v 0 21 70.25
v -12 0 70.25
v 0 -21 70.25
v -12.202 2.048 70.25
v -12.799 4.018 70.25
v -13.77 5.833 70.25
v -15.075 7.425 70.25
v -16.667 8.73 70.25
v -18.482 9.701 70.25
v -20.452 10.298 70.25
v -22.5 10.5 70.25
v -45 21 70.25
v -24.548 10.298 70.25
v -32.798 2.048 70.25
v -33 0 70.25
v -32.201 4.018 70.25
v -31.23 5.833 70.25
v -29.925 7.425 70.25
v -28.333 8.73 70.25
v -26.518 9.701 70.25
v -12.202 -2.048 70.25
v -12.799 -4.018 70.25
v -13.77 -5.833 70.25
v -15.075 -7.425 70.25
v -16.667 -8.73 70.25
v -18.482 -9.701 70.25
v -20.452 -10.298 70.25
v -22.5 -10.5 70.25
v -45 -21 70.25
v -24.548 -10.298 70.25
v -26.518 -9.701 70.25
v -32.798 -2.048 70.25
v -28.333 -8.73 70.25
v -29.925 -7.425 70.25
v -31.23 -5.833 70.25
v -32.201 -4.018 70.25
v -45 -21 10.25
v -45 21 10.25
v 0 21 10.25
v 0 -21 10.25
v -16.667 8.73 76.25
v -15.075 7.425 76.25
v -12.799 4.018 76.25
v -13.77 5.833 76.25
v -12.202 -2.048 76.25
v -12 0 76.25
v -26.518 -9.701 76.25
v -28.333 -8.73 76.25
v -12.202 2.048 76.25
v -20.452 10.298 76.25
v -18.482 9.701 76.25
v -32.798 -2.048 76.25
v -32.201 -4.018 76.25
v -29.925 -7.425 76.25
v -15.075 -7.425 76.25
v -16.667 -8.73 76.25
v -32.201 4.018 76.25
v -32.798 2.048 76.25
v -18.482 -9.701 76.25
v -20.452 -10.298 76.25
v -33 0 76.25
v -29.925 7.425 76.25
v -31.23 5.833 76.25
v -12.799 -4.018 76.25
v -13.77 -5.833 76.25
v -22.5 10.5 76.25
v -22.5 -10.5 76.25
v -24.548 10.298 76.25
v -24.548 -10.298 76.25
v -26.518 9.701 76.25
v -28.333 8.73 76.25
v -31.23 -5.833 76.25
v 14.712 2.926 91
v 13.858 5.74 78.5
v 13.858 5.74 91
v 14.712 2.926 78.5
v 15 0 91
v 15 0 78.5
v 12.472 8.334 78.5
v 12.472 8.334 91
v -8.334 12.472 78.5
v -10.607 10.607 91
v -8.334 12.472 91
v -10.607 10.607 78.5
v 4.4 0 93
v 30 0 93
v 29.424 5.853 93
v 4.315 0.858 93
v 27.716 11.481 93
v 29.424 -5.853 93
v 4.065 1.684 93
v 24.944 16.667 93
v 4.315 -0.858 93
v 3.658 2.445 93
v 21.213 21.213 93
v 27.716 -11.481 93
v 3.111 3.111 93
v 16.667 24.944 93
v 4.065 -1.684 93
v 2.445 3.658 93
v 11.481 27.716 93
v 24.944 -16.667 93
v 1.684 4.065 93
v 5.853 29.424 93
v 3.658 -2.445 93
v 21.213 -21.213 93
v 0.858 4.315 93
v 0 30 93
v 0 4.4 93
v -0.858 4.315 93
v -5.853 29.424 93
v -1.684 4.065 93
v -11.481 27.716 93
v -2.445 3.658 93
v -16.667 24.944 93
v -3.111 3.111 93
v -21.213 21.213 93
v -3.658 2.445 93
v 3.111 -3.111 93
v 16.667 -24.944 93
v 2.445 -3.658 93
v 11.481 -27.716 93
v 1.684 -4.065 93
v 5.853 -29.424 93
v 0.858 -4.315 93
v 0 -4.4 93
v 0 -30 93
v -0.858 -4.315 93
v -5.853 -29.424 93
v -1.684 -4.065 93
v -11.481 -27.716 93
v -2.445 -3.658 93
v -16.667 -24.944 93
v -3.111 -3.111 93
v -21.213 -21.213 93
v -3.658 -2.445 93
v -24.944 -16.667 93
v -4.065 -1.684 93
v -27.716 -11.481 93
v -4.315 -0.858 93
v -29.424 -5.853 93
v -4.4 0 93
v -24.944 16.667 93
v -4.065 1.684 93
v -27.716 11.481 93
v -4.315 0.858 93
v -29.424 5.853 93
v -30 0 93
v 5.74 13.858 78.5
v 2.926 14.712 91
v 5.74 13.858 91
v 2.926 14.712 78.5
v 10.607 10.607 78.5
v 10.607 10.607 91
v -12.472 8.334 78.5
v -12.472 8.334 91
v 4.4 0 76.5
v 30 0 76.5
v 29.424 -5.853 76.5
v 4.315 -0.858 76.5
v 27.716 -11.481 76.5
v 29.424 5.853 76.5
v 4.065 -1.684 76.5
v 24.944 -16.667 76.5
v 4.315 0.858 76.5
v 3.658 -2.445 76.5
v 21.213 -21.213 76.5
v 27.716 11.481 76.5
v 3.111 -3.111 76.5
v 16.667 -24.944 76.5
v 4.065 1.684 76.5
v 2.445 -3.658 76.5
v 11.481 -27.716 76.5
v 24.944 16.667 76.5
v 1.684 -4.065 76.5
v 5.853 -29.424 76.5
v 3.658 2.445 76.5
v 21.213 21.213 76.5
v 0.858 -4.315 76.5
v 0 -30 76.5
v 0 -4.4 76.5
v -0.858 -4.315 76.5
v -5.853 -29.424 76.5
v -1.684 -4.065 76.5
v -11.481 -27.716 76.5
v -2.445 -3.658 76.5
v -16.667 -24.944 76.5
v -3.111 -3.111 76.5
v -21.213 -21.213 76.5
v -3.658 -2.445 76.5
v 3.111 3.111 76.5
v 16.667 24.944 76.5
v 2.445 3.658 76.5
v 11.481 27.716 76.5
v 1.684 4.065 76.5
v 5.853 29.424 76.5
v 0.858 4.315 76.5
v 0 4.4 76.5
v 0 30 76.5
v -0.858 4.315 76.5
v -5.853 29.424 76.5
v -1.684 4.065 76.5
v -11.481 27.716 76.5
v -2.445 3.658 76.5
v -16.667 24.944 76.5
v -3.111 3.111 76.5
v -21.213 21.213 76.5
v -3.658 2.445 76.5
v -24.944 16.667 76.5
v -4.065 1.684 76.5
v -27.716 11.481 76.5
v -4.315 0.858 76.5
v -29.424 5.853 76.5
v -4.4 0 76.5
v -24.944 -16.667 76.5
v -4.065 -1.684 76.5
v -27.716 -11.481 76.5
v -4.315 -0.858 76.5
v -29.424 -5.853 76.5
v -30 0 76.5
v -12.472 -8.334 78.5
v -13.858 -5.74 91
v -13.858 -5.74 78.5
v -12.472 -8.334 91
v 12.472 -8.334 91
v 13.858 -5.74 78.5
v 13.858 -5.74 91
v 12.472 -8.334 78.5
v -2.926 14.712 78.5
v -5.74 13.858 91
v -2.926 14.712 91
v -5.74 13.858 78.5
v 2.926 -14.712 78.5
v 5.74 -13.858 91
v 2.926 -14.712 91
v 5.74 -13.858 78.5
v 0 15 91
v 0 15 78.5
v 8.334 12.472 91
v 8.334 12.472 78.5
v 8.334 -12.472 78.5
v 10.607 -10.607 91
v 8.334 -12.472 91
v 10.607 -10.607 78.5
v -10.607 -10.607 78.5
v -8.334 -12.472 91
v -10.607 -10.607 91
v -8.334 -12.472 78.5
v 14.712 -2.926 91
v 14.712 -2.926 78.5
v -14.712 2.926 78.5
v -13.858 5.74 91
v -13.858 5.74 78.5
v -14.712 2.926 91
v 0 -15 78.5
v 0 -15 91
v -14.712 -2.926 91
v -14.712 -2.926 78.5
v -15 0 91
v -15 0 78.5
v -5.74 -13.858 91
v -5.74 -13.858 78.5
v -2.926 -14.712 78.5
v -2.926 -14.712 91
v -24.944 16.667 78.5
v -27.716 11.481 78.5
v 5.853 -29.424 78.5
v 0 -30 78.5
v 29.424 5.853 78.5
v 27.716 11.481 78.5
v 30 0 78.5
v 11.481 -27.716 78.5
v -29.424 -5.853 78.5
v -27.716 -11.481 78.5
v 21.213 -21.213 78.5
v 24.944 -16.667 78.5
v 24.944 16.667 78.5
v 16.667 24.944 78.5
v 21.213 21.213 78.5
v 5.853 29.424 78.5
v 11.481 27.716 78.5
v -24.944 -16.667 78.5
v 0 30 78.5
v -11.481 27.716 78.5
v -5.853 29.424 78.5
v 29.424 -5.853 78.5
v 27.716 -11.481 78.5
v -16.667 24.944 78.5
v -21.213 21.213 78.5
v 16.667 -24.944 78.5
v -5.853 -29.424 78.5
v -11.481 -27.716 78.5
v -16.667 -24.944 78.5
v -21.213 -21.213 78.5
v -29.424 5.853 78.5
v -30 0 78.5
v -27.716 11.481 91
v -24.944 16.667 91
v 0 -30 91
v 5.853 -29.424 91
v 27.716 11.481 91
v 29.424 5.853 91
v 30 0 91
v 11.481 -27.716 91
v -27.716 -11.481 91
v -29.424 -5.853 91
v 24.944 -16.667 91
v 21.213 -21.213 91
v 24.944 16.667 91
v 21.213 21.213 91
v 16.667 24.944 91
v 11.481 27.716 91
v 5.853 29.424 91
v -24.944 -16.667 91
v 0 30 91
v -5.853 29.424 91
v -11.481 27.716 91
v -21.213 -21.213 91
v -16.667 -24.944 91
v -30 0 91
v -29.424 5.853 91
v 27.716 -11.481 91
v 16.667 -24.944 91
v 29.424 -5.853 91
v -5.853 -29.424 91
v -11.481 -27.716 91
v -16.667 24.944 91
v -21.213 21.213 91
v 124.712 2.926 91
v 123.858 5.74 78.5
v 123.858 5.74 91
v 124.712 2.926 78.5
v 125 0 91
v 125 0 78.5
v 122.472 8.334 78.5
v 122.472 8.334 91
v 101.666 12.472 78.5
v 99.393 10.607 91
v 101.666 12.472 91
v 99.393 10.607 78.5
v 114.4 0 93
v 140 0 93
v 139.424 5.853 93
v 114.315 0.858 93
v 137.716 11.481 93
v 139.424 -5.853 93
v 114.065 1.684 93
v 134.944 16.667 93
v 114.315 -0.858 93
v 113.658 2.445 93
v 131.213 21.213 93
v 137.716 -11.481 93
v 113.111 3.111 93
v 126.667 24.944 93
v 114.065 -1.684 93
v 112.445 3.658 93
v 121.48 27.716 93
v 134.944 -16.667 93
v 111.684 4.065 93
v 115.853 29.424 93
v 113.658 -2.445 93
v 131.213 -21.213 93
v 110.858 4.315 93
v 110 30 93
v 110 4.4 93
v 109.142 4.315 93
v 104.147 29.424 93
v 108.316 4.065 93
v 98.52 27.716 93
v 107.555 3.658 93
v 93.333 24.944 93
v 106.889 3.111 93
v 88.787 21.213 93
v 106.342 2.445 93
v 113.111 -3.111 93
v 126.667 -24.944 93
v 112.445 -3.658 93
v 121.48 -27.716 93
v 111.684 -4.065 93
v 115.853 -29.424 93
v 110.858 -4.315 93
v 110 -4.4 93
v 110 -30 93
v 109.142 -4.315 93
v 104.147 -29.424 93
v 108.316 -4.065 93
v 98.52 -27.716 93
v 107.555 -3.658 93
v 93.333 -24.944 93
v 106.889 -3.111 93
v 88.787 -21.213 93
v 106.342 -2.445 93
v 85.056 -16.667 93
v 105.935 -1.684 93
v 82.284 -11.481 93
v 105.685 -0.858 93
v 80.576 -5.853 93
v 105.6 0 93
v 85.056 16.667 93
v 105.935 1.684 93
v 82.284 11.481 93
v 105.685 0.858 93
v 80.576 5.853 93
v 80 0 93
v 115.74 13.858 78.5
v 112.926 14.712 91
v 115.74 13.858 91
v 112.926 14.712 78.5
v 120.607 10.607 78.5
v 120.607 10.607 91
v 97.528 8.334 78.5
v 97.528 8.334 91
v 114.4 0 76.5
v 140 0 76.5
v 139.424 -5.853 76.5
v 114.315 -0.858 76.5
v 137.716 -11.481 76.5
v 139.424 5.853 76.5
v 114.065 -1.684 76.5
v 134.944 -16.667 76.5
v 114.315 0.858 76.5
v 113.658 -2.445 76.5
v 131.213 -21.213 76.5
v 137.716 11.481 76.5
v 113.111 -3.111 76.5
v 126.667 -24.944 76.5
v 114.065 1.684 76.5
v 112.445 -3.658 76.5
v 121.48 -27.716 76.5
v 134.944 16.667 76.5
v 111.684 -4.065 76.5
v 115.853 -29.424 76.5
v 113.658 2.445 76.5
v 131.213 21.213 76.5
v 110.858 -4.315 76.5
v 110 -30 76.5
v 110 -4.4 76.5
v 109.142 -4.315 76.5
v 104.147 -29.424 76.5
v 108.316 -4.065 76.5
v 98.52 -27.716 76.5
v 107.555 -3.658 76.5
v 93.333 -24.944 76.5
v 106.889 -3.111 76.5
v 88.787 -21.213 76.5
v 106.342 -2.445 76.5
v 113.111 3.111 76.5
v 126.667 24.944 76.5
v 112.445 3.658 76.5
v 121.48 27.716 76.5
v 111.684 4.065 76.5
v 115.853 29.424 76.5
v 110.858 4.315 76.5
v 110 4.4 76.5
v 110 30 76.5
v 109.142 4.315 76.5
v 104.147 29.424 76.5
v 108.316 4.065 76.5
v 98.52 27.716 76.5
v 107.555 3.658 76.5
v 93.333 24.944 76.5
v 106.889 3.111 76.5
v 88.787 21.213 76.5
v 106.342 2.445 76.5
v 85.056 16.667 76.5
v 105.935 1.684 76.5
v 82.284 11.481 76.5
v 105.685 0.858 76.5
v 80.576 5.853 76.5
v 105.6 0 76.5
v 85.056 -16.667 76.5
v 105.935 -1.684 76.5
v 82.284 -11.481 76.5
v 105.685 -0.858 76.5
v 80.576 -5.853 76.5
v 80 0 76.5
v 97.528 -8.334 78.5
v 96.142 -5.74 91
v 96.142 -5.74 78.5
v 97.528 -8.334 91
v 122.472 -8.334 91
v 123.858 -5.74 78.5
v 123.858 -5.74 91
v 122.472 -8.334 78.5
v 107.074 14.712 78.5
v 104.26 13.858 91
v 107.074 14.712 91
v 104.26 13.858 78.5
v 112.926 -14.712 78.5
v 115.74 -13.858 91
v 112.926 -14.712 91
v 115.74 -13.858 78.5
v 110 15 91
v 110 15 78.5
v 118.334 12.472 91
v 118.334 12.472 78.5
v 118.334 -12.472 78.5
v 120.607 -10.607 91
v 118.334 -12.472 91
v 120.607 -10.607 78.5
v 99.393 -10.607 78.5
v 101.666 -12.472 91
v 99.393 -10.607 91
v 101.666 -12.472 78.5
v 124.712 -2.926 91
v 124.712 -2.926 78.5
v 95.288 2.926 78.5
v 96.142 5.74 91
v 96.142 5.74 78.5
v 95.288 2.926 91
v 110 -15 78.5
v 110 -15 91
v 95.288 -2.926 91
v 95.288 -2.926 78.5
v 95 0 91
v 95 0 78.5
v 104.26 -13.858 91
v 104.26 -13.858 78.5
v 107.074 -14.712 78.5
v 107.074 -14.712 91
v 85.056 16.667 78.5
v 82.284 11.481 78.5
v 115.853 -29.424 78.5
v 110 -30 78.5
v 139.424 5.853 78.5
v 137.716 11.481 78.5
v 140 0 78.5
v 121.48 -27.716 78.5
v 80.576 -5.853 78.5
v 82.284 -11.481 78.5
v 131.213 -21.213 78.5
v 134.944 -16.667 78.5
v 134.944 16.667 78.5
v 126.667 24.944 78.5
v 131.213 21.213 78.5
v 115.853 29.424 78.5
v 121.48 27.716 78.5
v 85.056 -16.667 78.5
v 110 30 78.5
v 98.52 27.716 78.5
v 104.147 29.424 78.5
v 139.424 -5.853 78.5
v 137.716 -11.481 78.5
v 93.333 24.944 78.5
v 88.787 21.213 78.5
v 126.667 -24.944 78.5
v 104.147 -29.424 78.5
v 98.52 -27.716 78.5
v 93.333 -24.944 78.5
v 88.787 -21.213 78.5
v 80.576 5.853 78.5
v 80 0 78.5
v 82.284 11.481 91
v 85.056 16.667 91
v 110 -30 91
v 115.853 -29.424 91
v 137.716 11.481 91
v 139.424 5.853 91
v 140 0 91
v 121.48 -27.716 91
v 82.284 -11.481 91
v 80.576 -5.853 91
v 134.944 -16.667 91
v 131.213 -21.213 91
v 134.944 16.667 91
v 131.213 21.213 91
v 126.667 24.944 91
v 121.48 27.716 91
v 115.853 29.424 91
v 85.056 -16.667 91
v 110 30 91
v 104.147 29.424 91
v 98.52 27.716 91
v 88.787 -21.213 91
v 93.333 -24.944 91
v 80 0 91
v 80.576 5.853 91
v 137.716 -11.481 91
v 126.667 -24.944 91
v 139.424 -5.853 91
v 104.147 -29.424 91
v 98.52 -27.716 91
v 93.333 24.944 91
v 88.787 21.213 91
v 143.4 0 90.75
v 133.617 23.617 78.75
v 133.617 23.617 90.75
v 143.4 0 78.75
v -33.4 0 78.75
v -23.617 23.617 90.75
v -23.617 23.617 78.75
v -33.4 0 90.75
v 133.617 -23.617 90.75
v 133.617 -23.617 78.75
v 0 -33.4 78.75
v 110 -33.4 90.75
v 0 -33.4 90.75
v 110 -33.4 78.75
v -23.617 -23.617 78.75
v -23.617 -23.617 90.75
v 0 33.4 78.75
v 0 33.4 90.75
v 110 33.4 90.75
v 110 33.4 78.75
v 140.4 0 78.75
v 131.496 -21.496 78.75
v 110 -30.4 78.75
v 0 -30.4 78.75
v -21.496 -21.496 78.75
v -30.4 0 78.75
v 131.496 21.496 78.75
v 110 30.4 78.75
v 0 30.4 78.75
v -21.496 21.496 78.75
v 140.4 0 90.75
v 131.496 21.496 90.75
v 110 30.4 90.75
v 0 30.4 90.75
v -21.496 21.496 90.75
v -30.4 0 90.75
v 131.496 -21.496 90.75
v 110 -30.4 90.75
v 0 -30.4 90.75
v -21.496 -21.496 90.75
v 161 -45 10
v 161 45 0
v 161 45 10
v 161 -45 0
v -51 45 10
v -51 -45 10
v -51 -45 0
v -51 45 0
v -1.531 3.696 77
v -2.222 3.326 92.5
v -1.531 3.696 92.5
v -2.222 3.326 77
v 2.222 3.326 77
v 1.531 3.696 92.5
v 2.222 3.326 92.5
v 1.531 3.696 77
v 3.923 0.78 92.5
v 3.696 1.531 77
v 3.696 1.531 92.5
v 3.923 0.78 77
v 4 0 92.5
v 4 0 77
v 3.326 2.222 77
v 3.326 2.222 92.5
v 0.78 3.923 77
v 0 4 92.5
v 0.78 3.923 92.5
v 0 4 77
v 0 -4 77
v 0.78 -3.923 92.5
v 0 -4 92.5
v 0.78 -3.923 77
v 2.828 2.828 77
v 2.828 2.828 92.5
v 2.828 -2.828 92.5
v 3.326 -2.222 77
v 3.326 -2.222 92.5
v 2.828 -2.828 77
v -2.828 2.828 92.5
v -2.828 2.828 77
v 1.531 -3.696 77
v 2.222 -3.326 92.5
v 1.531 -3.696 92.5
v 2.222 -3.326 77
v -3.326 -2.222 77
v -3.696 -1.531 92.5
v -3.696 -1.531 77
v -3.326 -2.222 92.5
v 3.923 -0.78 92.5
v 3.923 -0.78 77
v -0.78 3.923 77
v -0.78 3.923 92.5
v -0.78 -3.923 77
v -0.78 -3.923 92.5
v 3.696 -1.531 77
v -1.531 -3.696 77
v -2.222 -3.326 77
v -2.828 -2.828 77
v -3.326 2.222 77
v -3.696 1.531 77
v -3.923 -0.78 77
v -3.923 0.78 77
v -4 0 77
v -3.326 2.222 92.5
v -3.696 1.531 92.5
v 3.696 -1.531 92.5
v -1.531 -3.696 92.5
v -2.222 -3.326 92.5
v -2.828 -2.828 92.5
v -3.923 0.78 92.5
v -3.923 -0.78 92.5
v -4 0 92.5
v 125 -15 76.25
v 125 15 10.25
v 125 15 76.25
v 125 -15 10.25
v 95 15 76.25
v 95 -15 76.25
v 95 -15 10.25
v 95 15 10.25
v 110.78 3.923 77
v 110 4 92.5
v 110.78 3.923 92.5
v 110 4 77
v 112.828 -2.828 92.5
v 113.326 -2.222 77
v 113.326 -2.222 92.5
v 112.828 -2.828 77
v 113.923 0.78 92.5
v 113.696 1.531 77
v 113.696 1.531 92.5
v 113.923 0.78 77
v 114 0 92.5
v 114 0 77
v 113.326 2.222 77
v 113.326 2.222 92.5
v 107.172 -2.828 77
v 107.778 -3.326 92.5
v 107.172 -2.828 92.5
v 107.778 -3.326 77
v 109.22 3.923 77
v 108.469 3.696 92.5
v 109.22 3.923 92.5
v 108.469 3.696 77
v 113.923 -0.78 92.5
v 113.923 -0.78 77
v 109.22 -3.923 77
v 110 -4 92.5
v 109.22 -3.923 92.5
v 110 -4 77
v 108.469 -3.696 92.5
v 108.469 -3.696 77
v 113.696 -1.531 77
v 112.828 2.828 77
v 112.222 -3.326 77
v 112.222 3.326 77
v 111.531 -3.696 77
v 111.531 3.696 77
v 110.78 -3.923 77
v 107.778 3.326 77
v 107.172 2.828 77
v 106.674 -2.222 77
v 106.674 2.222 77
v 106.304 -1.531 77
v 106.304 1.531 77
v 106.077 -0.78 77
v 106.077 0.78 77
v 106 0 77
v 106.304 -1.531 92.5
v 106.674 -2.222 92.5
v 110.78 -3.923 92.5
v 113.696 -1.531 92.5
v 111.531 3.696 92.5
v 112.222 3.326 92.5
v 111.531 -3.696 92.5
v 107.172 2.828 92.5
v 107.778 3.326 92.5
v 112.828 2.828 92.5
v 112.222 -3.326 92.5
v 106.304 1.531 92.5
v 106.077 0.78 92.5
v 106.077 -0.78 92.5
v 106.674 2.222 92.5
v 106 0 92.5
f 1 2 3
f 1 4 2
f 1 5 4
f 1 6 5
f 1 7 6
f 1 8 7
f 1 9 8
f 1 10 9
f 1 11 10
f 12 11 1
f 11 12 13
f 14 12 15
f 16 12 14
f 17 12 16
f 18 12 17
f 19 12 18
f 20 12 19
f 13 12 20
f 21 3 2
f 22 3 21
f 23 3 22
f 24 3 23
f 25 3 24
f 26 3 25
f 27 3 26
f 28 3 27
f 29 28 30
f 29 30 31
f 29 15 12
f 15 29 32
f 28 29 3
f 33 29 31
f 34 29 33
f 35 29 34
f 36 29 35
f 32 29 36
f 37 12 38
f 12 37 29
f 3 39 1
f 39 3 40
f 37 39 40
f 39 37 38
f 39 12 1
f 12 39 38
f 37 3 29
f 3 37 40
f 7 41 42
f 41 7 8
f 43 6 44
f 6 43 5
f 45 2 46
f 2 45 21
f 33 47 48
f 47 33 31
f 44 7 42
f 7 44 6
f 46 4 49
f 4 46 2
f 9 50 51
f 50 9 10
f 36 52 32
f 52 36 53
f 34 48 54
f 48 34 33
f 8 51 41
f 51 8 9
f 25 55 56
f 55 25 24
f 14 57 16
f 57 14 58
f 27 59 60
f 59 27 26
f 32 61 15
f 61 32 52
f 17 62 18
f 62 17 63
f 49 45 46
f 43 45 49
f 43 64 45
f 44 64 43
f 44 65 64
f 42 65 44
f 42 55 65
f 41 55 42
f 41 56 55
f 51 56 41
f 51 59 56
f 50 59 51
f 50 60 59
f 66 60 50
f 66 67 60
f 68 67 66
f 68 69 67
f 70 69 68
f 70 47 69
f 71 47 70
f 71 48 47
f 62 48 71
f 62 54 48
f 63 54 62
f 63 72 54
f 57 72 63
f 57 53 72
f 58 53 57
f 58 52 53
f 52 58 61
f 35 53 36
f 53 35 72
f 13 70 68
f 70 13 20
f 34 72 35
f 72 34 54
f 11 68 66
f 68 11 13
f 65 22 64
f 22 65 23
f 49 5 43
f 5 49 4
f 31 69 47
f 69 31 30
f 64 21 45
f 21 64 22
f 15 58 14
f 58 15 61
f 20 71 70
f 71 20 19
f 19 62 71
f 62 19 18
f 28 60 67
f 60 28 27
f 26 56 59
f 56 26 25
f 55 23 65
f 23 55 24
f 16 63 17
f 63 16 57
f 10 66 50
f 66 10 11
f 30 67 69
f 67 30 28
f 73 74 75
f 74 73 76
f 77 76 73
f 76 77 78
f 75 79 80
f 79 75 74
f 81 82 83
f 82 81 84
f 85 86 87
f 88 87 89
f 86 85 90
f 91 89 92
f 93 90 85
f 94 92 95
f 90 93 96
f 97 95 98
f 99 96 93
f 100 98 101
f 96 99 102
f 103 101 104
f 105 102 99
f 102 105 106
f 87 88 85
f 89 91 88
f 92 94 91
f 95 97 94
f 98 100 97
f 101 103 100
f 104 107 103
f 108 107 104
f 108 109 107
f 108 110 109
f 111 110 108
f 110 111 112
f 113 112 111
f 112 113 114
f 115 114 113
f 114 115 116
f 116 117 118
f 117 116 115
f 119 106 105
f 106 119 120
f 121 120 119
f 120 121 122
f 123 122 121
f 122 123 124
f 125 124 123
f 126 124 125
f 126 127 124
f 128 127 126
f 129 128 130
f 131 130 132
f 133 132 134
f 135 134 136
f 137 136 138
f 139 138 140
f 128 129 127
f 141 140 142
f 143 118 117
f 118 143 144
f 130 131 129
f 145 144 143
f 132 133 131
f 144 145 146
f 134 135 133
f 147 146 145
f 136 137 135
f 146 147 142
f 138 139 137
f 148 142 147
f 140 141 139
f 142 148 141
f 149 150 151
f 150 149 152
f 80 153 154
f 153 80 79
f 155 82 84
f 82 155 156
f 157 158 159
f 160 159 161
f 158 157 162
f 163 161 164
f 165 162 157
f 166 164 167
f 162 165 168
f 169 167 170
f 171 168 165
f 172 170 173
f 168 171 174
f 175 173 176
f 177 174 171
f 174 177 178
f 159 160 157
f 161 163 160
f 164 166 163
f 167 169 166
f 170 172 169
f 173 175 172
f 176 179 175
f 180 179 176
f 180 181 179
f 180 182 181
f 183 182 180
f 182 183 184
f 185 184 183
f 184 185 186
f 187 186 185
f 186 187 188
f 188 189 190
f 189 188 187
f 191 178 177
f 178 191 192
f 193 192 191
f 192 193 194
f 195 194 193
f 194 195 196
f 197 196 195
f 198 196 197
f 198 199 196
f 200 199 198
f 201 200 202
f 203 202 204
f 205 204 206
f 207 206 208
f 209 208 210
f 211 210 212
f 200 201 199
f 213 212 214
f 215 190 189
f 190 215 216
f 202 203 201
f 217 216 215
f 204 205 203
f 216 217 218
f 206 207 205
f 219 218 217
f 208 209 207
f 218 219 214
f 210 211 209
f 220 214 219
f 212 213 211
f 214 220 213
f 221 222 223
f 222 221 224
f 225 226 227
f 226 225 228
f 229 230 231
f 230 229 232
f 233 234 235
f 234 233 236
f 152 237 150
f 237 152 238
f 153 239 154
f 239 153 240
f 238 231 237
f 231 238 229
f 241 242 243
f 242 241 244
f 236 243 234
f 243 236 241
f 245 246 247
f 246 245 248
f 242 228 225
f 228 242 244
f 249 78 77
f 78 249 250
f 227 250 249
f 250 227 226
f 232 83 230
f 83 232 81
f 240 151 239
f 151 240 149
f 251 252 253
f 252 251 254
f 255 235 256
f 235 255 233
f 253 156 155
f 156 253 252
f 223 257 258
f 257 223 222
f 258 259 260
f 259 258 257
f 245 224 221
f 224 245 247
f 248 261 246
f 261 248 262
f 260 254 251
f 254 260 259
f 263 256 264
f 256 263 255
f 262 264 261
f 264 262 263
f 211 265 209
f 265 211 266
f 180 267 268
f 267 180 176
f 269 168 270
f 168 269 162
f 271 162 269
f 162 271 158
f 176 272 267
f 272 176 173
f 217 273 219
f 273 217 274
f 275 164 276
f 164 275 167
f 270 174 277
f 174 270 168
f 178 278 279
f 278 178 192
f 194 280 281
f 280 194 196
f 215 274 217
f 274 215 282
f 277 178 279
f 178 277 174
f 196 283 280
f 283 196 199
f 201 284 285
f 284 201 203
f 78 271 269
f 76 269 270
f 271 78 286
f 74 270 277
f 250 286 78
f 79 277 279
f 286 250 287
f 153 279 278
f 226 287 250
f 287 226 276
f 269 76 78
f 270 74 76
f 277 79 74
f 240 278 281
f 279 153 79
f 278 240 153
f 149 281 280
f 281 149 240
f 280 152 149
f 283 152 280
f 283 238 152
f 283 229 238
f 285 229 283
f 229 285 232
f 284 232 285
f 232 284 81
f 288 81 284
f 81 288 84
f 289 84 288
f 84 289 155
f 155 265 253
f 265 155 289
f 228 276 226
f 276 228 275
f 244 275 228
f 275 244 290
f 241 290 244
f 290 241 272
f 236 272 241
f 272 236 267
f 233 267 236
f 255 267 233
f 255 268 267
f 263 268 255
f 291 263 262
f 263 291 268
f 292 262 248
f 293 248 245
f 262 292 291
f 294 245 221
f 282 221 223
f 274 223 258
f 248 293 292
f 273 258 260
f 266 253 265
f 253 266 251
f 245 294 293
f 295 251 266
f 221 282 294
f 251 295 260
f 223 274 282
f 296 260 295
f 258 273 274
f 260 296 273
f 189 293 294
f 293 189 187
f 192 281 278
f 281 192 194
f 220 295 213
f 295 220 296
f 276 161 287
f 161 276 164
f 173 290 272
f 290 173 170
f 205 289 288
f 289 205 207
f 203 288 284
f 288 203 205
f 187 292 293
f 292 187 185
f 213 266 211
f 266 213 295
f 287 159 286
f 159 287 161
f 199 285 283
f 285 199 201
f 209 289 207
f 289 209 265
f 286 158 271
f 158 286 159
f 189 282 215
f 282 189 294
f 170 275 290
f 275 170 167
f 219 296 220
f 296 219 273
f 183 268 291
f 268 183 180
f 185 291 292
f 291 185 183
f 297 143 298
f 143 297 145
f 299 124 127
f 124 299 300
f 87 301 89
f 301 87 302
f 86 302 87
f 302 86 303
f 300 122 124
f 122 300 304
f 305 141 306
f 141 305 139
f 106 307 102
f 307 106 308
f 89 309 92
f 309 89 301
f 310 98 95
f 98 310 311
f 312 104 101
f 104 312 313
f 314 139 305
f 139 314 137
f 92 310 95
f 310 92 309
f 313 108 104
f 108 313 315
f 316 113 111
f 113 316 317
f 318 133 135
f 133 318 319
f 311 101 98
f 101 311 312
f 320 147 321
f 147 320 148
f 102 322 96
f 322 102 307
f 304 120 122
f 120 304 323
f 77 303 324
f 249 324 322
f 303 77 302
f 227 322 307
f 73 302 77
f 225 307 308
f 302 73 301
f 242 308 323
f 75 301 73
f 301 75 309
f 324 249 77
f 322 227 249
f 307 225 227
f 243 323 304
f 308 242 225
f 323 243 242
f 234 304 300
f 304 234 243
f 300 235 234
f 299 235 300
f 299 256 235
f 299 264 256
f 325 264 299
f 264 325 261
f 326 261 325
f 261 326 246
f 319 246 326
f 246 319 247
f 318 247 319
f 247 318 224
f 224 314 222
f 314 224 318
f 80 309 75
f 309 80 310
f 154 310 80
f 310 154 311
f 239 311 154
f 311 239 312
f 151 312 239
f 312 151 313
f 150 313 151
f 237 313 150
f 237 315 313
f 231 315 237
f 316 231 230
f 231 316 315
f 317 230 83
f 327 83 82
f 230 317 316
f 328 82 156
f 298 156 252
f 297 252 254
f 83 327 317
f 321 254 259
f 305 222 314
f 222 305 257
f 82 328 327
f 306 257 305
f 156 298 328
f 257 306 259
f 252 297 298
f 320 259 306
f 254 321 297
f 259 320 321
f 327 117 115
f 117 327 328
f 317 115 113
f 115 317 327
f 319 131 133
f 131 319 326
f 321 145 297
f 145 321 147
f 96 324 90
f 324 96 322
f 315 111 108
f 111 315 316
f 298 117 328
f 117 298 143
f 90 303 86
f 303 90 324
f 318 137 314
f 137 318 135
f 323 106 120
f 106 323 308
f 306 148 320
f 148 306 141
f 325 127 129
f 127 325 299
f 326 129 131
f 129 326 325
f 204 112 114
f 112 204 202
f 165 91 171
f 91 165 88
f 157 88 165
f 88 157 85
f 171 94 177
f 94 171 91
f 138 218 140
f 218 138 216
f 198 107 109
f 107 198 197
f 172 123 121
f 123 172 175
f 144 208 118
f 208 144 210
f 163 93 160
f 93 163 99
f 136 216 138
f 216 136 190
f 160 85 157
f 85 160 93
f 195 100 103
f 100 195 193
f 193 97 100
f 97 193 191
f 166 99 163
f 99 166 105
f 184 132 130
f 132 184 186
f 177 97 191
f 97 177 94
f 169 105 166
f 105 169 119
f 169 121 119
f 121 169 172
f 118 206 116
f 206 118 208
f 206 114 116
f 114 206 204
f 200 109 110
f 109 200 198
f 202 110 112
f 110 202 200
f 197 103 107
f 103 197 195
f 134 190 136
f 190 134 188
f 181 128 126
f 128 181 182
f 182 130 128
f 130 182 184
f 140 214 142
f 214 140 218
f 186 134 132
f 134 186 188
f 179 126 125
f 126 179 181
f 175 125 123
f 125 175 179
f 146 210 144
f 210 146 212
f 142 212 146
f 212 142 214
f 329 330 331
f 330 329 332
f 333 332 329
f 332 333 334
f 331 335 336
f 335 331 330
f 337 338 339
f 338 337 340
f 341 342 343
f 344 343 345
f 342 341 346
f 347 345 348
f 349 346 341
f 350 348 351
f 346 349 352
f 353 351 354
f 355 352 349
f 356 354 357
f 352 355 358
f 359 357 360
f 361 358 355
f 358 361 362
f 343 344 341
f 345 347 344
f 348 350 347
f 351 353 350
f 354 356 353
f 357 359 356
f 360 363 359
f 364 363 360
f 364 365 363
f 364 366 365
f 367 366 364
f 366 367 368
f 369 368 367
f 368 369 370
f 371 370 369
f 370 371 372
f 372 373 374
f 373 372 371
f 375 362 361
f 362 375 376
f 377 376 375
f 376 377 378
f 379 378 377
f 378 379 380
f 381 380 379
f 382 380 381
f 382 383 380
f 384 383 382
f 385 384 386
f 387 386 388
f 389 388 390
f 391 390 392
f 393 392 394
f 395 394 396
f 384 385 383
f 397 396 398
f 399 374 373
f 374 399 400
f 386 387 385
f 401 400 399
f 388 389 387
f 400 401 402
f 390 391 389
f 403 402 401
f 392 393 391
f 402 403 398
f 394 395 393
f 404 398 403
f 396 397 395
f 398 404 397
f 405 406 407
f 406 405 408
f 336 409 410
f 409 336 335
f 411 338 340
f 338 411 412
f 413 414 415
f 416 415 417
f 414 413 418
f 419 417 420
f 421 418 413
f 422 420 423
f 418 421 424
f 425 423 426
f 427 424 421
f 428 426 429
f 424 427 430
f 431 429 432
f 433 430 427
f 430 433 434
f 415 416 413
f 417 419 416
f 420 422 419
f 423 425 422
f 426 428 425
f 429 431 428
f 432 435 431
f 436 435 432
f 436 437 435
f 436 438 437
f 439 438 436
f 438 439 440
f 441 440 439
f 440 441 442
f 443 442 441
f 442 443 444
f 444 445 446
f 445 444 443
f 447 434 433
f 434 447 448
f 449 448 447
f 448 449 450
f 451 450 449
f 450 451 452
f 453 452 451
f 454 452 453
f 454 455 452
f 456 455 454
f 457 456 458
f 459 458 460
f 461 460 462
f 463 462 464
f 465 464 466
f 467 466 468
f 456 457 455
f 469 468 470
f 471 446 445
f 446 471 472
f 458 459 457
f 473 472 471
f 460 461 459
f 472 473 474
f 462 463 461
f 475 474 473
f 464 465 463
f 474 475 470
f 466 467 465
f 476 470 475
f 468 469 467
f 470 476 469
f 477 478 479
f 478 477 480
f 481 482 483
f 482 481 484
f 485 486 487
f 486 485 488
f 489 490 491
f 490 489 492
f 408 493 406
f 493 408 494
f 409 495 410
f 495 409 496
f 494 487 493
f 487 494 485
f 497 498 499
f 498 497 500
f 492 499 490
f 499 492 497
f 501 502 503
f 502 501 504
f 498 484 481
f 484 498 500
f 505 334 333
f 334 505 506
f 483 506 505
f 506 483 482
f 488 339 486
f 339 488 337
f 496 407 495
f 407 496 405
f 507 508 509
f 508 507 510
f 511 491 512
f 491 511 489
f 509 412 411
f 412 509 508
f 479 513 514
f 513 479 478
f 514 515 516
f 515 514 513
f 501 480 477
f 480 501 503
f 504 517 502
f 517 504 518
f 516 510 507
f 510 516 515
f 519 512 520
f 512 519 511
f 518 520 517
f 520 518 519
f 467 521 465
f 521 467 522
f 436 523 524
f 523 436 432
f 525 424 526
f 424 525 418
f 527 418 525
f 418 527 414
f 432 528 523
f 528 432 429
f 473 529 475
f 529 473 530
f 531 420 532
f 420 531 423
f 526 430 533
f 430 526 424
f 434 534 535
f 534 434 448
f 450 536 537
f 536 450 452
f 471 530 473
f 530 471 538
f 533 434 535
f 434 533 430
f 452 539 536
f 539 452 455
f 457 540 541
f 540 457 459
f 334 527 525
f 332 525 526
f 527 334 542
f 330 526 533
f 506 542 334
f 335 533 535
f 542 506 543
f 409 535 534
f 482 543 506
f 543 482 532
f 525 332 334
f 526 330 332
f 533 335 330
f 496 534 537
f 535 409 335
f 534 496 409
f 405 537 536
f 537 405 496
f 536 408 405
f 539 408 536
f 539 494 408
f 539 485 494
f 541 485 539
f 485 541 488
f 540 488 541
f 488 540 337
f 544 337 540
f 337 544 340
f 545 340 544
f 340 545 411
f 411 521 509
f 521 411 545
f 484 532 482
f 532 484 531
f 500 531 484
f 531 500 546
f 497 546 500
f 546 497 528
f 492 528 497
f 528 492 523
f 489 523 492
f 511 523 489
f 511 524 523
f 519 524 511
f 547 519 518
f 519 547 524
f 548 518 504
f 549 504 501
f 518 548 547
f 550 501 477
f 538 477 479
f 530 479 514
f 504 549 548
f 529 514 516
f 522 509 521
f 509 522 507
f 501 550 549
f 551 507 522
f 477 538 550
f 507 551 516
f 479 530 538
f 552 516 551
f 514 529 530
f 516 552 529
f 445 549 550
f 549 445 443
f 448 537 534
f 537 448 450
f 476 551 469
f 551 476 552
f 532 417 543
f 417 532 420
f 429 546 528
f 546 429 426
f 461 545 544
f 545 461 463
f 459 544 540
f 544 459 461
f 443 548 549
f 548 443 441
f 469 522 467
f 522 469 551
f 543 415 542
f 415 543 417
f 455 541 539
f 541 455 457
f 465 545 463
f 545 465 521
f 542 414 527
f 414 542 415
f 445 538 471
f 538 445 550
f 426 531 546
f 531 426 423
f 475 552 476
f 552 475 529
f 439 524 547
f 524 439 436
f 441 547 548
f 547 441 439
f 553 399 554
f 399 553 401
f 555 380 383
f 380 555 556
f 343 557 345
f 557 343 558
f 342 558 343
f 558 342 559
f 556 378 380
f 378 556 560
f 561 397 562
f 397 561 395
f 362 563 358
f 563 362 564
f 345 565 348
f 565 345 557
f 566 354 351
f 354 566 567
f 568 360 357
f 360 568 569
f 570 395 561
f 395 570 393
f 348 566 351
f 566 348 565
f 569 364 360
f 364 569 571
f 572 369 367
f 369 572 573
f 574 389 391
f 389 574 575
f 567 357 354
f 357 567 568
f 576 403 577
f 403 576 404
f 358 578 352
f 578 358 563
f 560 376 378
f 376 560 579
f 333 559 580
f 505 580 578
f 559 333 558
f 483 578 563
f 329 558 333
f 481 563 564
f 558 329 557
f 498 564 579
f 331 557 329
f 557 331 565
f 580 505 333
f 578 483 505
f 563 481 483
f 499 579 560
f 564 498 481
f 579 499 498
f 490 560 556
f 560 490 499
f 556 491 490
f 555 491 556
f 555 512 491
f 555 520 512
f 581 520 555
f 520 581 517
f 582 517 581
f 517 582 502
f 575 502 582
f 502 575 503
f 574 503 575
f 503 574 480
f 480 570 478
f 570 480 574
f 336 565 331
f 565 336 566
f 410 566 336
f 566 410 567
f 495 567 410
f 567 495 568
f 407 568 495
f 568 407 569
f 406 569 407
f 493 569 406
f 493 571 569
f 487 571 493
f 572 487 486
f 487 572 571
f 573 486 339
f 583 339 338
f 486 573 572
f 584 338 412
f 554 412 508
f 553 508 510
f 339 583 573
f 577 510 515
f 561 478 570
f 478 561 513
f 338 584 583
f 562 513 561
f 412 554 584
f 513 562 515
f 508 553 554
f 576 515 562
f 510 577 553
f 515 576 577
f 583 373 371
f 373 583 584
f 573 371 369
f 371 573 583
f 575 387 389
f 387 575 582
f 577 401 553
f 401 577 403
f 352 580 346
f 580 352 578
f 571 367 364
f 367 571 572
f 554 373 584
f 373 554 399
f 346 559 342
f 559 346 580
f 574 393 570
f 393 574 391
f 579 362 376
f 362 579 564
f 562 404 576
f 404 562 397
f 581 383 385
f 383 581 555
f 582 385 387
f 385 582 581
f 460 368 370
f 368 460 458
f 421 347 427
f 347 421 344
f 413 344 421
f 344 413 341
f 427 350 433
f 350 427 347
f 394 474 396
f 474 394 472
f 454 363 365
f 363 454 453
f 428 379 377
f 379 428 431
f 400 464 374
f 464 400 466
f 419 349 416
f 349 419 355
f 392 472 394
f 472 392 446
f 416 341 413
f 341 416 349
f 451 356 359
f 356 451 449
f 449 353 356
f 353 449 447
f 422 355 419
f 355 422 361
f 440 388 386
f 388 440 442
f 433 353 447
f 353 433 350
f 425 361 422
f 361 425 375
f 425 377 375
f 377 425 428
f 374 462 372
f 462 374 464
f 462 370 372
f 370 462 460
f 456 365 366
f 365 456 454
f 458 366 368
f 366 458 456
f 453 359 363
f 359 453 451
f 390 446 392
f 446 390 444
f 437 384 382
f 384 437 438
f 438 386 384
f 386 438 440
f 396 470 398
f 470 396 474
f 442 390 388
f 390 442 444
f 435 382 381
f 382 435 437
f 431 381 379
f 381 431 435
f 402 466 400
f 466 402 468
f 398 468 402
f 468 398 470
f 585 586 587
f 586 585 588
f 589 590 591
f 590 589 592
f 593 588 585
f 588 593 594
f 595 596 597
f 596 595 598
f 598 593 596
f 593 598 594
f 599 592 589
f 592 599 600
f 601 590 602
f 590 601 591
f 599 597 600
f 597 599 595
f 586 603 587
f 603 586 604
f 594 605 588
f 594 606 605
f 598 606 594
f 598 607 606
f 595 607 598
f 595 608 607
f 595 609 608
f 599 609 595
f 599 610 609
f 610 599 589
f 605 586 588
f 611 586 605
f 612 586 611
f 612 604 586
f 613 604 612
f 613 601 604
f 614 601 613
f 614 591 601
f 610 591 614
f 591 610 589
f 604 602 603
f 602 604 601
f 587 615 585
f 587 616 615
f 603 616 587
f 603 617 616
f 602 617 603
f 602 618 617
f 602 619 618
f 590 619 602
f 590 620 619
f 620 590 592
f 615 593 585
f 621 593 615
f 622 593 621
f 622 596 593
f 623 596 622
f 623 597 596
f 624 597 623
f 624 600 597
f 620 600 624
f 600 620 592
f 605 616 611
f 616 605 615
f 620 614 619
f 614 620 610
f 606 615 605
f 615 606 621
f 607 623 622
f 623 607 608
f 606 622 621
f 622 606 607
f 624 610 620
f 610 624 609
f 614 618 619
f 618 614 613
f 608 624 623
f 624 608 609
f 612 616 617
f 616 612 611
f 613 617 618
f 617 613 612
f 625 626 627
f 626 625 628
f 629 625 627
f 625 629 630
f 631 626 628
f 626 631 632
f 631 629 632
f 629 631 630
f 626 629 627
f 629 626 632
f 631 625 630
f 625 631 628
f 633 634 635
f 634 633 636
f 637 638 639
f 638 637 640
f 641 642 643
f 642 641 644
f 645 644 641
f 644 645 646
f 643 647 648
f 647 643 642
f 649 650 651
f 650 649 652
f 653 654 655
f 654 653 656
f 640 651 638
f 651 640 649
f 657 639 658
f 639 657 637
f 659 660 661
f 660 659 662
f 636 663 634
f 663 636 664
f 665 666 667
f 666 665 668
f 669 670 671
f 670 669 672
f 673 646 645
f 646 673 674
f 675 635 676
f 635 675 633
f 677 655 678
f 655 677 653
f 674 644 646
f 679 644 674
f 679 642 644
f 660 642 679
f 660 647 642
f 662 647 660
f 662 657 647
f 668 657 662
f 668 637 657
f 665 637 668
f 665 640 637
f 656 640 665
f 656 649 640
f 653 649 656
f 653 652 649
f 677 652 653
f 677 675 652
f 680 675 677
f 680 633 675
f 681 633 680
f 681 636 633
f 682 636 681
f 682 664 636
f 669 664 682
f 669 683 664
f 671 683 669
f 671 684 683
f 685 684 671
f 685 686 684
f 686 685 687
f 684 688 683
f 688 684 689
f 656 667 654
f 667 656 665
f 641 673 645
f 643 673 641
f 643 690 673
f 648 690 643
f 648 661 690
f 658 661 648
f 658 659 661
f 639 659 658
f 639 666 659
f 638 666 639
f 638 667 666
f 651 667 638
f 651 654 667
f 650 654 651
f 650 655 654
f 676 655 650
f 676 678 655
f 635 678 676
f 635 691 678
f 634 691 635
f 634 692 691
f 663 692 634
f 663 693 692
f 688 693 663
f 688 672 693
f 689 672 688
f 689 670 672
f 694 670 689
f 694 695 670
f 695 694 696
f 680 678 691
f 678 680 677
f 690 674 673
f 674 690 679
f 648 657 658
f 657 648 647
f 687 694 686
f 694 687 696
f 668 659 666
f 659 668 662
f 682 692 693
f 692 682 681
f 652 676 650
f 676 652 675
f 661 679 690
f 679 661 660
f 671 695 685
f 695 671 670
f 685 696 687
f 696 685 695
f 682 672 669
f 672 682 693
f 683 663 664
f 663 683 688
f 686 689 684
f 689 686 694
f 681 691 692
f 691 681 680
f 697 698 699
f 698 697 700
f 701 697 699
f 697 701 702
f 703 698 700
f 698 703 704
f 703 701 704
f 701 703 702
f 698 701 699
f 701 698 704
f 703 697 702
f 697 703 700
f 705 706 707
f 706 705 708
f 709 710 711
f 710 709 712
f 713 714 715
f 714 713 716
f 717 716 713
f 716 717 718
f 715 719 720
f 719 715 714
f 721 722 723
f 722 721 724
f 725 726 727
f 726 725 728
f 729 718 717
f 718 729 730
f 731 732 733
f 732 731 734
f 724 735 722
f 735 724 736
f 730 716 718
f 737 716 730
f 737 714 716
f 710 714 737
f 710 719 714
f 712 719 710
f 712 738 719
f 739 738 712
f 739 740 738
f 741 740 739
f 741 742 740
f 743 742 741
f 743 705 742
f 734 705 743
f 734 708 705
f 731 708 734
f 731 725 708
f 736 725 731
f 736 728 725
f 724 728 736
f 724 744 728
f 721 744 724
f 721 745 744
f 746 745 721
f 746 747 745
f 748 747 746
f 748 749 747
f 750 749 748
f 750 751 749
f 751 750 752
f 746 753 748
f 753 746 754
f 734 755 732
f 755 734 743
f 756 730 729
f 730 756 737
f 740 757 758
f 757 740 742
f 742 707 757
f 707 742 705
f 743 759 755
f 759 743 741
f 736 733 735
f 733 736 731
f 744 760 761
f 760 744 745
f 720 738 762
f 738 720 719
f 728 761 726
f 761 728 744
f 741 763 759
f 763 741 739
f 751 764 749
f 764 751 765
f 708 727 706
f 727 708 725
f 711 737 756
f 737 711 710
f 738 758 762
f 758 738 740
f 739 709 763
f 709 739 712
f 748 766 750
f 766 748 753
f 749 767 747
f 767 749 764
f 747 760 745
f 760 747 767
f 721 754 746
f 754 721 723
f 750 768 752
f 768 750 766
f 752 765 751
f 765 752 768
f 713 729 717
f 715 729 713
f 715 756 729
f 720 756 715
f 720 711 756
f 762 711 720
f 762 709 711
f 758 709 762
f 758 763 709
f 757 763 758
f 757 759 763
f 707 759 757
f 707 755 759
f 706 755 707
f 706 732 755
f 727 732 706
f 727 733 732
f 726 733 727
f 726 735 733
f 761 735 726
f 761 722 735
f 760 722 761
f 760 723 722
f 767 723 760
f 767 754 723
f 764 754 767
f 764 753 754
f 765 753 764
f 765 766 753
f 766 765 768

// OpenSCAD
$fn = 32;

// ------------------------------------------------------------------------
// Motor belt drive: span 110 mm, pulleys d60, belt 12 mm wide
// Every part is its own module, assembly() places every instance.
// ------------------------------------------------------------------------

// --- part 1 ---
module base_plate() {
  difference() {
    translate([-106, -45, 0]) cube([212, 90, 10]);
  }
}

// --- part 2 ---
module motor() {
  union() {
    translate([-30, -21, 0]) cube([60, 42, 45]);
    translate([33, 0, 22.5]) rotate([0, 90, 0]) cylinder(h = 6, d = 21, center = true);
  }
}

// --- part 3 ---
module drive_shaft() {
  translate([0, 0, -7.75]) cylinder(h = 15.5, d = 8);
}

// --- part 4 ---
module pulley_drive() {
  difference() {
    union() {
      cylinder(h = 16.5, d = 30);
      cylinder(h = 2, d = 60);
      translate([0, 0, 14.5]) cylinder(h = 2, d = 60);
    }
    translate([0, 0, -1]) cylinder(h = 18.5, d = 8.8);
  }
}

// --- part 5 ---
module idler_post() {
  translate([-15, -15, 0]) cube([30, 30, 66]);
}

// --- part 6 ---
module driven_shaft() {
  translate([0, 0, -7.75]) cylinder(h = 15.5, d = 8);
}

// --- part 7 ---
module pulley_driven() {
  difference() {
    union() {
      cylinder(h = 16.5, d = 30);
      cylinder(h = 2, d = 60);
      translate([0, 0, 14.5]) cylinder(h = 2, d = 60);
    }
    translate([0, 0, -1]) cylinder(h = 18.5, d = 8.8);
  }
}

// --- part 8 ---
module drive_belt() {
  difference() {
    linear_extrude(height = 12) polygon(points = concat([for (a = [90 : 45 : 270]) [33.4 * cos(a), 33.4 * sin(a)]], [for (a = [270 : 45 : 450]) [110 + 33.4 * cos(a), 33.4 * sin(a)]]));
    translate([0, 0, -1]) linear_extrude(height = 14) polygon(points = concat([for (a = [90 : 45 : 270]) [30.4 * cos(a), 30.4 * sin(a)]], [for (a = [270 : 45 : 450]) [110 + 30.4 * cos(a), 30.4 * sin(a)]]));
  }
}

// --- assembly ---
module assembly() {
  color([0.80, 0.24, 0.20]) translate([55, 0, 0]) rotate([0, 0, 0]) base_plate();
  color([0.20, 0.45, 0.75]) translate([0, 0, 40.25]) rotate([0, 270, 0]) motor();
  color([0.25, 0.62, 0.32]) translate([0, 0, 84.75]) rotate([0, 0, 0]) drive_shaft();
  color([0.92, 0.70, 0.18]) translate([0, 0, 76.5]) rotate([0, 0, 0]) pulley_drive();
  color([0.58, 0.35, 0.70]) translate([110, 0, 10.25]) rotate([0, 0, 0]) idler_post();
  color([0.16, 0.66, 0.66]) translate([110, 0, 84.75]) rotate([0, 0, 0]) driven_shaft();
  color([0.85, 0.48, 0.18]) translate([110, 0, 76.5]) rotate([0, 0, 0]) pulley_driven();
  color([0.55, 0.60, 0.65]) translate([0, 0, 78.75]) rotate([0, 0, 0]) drive_belt();
}

assembly();
